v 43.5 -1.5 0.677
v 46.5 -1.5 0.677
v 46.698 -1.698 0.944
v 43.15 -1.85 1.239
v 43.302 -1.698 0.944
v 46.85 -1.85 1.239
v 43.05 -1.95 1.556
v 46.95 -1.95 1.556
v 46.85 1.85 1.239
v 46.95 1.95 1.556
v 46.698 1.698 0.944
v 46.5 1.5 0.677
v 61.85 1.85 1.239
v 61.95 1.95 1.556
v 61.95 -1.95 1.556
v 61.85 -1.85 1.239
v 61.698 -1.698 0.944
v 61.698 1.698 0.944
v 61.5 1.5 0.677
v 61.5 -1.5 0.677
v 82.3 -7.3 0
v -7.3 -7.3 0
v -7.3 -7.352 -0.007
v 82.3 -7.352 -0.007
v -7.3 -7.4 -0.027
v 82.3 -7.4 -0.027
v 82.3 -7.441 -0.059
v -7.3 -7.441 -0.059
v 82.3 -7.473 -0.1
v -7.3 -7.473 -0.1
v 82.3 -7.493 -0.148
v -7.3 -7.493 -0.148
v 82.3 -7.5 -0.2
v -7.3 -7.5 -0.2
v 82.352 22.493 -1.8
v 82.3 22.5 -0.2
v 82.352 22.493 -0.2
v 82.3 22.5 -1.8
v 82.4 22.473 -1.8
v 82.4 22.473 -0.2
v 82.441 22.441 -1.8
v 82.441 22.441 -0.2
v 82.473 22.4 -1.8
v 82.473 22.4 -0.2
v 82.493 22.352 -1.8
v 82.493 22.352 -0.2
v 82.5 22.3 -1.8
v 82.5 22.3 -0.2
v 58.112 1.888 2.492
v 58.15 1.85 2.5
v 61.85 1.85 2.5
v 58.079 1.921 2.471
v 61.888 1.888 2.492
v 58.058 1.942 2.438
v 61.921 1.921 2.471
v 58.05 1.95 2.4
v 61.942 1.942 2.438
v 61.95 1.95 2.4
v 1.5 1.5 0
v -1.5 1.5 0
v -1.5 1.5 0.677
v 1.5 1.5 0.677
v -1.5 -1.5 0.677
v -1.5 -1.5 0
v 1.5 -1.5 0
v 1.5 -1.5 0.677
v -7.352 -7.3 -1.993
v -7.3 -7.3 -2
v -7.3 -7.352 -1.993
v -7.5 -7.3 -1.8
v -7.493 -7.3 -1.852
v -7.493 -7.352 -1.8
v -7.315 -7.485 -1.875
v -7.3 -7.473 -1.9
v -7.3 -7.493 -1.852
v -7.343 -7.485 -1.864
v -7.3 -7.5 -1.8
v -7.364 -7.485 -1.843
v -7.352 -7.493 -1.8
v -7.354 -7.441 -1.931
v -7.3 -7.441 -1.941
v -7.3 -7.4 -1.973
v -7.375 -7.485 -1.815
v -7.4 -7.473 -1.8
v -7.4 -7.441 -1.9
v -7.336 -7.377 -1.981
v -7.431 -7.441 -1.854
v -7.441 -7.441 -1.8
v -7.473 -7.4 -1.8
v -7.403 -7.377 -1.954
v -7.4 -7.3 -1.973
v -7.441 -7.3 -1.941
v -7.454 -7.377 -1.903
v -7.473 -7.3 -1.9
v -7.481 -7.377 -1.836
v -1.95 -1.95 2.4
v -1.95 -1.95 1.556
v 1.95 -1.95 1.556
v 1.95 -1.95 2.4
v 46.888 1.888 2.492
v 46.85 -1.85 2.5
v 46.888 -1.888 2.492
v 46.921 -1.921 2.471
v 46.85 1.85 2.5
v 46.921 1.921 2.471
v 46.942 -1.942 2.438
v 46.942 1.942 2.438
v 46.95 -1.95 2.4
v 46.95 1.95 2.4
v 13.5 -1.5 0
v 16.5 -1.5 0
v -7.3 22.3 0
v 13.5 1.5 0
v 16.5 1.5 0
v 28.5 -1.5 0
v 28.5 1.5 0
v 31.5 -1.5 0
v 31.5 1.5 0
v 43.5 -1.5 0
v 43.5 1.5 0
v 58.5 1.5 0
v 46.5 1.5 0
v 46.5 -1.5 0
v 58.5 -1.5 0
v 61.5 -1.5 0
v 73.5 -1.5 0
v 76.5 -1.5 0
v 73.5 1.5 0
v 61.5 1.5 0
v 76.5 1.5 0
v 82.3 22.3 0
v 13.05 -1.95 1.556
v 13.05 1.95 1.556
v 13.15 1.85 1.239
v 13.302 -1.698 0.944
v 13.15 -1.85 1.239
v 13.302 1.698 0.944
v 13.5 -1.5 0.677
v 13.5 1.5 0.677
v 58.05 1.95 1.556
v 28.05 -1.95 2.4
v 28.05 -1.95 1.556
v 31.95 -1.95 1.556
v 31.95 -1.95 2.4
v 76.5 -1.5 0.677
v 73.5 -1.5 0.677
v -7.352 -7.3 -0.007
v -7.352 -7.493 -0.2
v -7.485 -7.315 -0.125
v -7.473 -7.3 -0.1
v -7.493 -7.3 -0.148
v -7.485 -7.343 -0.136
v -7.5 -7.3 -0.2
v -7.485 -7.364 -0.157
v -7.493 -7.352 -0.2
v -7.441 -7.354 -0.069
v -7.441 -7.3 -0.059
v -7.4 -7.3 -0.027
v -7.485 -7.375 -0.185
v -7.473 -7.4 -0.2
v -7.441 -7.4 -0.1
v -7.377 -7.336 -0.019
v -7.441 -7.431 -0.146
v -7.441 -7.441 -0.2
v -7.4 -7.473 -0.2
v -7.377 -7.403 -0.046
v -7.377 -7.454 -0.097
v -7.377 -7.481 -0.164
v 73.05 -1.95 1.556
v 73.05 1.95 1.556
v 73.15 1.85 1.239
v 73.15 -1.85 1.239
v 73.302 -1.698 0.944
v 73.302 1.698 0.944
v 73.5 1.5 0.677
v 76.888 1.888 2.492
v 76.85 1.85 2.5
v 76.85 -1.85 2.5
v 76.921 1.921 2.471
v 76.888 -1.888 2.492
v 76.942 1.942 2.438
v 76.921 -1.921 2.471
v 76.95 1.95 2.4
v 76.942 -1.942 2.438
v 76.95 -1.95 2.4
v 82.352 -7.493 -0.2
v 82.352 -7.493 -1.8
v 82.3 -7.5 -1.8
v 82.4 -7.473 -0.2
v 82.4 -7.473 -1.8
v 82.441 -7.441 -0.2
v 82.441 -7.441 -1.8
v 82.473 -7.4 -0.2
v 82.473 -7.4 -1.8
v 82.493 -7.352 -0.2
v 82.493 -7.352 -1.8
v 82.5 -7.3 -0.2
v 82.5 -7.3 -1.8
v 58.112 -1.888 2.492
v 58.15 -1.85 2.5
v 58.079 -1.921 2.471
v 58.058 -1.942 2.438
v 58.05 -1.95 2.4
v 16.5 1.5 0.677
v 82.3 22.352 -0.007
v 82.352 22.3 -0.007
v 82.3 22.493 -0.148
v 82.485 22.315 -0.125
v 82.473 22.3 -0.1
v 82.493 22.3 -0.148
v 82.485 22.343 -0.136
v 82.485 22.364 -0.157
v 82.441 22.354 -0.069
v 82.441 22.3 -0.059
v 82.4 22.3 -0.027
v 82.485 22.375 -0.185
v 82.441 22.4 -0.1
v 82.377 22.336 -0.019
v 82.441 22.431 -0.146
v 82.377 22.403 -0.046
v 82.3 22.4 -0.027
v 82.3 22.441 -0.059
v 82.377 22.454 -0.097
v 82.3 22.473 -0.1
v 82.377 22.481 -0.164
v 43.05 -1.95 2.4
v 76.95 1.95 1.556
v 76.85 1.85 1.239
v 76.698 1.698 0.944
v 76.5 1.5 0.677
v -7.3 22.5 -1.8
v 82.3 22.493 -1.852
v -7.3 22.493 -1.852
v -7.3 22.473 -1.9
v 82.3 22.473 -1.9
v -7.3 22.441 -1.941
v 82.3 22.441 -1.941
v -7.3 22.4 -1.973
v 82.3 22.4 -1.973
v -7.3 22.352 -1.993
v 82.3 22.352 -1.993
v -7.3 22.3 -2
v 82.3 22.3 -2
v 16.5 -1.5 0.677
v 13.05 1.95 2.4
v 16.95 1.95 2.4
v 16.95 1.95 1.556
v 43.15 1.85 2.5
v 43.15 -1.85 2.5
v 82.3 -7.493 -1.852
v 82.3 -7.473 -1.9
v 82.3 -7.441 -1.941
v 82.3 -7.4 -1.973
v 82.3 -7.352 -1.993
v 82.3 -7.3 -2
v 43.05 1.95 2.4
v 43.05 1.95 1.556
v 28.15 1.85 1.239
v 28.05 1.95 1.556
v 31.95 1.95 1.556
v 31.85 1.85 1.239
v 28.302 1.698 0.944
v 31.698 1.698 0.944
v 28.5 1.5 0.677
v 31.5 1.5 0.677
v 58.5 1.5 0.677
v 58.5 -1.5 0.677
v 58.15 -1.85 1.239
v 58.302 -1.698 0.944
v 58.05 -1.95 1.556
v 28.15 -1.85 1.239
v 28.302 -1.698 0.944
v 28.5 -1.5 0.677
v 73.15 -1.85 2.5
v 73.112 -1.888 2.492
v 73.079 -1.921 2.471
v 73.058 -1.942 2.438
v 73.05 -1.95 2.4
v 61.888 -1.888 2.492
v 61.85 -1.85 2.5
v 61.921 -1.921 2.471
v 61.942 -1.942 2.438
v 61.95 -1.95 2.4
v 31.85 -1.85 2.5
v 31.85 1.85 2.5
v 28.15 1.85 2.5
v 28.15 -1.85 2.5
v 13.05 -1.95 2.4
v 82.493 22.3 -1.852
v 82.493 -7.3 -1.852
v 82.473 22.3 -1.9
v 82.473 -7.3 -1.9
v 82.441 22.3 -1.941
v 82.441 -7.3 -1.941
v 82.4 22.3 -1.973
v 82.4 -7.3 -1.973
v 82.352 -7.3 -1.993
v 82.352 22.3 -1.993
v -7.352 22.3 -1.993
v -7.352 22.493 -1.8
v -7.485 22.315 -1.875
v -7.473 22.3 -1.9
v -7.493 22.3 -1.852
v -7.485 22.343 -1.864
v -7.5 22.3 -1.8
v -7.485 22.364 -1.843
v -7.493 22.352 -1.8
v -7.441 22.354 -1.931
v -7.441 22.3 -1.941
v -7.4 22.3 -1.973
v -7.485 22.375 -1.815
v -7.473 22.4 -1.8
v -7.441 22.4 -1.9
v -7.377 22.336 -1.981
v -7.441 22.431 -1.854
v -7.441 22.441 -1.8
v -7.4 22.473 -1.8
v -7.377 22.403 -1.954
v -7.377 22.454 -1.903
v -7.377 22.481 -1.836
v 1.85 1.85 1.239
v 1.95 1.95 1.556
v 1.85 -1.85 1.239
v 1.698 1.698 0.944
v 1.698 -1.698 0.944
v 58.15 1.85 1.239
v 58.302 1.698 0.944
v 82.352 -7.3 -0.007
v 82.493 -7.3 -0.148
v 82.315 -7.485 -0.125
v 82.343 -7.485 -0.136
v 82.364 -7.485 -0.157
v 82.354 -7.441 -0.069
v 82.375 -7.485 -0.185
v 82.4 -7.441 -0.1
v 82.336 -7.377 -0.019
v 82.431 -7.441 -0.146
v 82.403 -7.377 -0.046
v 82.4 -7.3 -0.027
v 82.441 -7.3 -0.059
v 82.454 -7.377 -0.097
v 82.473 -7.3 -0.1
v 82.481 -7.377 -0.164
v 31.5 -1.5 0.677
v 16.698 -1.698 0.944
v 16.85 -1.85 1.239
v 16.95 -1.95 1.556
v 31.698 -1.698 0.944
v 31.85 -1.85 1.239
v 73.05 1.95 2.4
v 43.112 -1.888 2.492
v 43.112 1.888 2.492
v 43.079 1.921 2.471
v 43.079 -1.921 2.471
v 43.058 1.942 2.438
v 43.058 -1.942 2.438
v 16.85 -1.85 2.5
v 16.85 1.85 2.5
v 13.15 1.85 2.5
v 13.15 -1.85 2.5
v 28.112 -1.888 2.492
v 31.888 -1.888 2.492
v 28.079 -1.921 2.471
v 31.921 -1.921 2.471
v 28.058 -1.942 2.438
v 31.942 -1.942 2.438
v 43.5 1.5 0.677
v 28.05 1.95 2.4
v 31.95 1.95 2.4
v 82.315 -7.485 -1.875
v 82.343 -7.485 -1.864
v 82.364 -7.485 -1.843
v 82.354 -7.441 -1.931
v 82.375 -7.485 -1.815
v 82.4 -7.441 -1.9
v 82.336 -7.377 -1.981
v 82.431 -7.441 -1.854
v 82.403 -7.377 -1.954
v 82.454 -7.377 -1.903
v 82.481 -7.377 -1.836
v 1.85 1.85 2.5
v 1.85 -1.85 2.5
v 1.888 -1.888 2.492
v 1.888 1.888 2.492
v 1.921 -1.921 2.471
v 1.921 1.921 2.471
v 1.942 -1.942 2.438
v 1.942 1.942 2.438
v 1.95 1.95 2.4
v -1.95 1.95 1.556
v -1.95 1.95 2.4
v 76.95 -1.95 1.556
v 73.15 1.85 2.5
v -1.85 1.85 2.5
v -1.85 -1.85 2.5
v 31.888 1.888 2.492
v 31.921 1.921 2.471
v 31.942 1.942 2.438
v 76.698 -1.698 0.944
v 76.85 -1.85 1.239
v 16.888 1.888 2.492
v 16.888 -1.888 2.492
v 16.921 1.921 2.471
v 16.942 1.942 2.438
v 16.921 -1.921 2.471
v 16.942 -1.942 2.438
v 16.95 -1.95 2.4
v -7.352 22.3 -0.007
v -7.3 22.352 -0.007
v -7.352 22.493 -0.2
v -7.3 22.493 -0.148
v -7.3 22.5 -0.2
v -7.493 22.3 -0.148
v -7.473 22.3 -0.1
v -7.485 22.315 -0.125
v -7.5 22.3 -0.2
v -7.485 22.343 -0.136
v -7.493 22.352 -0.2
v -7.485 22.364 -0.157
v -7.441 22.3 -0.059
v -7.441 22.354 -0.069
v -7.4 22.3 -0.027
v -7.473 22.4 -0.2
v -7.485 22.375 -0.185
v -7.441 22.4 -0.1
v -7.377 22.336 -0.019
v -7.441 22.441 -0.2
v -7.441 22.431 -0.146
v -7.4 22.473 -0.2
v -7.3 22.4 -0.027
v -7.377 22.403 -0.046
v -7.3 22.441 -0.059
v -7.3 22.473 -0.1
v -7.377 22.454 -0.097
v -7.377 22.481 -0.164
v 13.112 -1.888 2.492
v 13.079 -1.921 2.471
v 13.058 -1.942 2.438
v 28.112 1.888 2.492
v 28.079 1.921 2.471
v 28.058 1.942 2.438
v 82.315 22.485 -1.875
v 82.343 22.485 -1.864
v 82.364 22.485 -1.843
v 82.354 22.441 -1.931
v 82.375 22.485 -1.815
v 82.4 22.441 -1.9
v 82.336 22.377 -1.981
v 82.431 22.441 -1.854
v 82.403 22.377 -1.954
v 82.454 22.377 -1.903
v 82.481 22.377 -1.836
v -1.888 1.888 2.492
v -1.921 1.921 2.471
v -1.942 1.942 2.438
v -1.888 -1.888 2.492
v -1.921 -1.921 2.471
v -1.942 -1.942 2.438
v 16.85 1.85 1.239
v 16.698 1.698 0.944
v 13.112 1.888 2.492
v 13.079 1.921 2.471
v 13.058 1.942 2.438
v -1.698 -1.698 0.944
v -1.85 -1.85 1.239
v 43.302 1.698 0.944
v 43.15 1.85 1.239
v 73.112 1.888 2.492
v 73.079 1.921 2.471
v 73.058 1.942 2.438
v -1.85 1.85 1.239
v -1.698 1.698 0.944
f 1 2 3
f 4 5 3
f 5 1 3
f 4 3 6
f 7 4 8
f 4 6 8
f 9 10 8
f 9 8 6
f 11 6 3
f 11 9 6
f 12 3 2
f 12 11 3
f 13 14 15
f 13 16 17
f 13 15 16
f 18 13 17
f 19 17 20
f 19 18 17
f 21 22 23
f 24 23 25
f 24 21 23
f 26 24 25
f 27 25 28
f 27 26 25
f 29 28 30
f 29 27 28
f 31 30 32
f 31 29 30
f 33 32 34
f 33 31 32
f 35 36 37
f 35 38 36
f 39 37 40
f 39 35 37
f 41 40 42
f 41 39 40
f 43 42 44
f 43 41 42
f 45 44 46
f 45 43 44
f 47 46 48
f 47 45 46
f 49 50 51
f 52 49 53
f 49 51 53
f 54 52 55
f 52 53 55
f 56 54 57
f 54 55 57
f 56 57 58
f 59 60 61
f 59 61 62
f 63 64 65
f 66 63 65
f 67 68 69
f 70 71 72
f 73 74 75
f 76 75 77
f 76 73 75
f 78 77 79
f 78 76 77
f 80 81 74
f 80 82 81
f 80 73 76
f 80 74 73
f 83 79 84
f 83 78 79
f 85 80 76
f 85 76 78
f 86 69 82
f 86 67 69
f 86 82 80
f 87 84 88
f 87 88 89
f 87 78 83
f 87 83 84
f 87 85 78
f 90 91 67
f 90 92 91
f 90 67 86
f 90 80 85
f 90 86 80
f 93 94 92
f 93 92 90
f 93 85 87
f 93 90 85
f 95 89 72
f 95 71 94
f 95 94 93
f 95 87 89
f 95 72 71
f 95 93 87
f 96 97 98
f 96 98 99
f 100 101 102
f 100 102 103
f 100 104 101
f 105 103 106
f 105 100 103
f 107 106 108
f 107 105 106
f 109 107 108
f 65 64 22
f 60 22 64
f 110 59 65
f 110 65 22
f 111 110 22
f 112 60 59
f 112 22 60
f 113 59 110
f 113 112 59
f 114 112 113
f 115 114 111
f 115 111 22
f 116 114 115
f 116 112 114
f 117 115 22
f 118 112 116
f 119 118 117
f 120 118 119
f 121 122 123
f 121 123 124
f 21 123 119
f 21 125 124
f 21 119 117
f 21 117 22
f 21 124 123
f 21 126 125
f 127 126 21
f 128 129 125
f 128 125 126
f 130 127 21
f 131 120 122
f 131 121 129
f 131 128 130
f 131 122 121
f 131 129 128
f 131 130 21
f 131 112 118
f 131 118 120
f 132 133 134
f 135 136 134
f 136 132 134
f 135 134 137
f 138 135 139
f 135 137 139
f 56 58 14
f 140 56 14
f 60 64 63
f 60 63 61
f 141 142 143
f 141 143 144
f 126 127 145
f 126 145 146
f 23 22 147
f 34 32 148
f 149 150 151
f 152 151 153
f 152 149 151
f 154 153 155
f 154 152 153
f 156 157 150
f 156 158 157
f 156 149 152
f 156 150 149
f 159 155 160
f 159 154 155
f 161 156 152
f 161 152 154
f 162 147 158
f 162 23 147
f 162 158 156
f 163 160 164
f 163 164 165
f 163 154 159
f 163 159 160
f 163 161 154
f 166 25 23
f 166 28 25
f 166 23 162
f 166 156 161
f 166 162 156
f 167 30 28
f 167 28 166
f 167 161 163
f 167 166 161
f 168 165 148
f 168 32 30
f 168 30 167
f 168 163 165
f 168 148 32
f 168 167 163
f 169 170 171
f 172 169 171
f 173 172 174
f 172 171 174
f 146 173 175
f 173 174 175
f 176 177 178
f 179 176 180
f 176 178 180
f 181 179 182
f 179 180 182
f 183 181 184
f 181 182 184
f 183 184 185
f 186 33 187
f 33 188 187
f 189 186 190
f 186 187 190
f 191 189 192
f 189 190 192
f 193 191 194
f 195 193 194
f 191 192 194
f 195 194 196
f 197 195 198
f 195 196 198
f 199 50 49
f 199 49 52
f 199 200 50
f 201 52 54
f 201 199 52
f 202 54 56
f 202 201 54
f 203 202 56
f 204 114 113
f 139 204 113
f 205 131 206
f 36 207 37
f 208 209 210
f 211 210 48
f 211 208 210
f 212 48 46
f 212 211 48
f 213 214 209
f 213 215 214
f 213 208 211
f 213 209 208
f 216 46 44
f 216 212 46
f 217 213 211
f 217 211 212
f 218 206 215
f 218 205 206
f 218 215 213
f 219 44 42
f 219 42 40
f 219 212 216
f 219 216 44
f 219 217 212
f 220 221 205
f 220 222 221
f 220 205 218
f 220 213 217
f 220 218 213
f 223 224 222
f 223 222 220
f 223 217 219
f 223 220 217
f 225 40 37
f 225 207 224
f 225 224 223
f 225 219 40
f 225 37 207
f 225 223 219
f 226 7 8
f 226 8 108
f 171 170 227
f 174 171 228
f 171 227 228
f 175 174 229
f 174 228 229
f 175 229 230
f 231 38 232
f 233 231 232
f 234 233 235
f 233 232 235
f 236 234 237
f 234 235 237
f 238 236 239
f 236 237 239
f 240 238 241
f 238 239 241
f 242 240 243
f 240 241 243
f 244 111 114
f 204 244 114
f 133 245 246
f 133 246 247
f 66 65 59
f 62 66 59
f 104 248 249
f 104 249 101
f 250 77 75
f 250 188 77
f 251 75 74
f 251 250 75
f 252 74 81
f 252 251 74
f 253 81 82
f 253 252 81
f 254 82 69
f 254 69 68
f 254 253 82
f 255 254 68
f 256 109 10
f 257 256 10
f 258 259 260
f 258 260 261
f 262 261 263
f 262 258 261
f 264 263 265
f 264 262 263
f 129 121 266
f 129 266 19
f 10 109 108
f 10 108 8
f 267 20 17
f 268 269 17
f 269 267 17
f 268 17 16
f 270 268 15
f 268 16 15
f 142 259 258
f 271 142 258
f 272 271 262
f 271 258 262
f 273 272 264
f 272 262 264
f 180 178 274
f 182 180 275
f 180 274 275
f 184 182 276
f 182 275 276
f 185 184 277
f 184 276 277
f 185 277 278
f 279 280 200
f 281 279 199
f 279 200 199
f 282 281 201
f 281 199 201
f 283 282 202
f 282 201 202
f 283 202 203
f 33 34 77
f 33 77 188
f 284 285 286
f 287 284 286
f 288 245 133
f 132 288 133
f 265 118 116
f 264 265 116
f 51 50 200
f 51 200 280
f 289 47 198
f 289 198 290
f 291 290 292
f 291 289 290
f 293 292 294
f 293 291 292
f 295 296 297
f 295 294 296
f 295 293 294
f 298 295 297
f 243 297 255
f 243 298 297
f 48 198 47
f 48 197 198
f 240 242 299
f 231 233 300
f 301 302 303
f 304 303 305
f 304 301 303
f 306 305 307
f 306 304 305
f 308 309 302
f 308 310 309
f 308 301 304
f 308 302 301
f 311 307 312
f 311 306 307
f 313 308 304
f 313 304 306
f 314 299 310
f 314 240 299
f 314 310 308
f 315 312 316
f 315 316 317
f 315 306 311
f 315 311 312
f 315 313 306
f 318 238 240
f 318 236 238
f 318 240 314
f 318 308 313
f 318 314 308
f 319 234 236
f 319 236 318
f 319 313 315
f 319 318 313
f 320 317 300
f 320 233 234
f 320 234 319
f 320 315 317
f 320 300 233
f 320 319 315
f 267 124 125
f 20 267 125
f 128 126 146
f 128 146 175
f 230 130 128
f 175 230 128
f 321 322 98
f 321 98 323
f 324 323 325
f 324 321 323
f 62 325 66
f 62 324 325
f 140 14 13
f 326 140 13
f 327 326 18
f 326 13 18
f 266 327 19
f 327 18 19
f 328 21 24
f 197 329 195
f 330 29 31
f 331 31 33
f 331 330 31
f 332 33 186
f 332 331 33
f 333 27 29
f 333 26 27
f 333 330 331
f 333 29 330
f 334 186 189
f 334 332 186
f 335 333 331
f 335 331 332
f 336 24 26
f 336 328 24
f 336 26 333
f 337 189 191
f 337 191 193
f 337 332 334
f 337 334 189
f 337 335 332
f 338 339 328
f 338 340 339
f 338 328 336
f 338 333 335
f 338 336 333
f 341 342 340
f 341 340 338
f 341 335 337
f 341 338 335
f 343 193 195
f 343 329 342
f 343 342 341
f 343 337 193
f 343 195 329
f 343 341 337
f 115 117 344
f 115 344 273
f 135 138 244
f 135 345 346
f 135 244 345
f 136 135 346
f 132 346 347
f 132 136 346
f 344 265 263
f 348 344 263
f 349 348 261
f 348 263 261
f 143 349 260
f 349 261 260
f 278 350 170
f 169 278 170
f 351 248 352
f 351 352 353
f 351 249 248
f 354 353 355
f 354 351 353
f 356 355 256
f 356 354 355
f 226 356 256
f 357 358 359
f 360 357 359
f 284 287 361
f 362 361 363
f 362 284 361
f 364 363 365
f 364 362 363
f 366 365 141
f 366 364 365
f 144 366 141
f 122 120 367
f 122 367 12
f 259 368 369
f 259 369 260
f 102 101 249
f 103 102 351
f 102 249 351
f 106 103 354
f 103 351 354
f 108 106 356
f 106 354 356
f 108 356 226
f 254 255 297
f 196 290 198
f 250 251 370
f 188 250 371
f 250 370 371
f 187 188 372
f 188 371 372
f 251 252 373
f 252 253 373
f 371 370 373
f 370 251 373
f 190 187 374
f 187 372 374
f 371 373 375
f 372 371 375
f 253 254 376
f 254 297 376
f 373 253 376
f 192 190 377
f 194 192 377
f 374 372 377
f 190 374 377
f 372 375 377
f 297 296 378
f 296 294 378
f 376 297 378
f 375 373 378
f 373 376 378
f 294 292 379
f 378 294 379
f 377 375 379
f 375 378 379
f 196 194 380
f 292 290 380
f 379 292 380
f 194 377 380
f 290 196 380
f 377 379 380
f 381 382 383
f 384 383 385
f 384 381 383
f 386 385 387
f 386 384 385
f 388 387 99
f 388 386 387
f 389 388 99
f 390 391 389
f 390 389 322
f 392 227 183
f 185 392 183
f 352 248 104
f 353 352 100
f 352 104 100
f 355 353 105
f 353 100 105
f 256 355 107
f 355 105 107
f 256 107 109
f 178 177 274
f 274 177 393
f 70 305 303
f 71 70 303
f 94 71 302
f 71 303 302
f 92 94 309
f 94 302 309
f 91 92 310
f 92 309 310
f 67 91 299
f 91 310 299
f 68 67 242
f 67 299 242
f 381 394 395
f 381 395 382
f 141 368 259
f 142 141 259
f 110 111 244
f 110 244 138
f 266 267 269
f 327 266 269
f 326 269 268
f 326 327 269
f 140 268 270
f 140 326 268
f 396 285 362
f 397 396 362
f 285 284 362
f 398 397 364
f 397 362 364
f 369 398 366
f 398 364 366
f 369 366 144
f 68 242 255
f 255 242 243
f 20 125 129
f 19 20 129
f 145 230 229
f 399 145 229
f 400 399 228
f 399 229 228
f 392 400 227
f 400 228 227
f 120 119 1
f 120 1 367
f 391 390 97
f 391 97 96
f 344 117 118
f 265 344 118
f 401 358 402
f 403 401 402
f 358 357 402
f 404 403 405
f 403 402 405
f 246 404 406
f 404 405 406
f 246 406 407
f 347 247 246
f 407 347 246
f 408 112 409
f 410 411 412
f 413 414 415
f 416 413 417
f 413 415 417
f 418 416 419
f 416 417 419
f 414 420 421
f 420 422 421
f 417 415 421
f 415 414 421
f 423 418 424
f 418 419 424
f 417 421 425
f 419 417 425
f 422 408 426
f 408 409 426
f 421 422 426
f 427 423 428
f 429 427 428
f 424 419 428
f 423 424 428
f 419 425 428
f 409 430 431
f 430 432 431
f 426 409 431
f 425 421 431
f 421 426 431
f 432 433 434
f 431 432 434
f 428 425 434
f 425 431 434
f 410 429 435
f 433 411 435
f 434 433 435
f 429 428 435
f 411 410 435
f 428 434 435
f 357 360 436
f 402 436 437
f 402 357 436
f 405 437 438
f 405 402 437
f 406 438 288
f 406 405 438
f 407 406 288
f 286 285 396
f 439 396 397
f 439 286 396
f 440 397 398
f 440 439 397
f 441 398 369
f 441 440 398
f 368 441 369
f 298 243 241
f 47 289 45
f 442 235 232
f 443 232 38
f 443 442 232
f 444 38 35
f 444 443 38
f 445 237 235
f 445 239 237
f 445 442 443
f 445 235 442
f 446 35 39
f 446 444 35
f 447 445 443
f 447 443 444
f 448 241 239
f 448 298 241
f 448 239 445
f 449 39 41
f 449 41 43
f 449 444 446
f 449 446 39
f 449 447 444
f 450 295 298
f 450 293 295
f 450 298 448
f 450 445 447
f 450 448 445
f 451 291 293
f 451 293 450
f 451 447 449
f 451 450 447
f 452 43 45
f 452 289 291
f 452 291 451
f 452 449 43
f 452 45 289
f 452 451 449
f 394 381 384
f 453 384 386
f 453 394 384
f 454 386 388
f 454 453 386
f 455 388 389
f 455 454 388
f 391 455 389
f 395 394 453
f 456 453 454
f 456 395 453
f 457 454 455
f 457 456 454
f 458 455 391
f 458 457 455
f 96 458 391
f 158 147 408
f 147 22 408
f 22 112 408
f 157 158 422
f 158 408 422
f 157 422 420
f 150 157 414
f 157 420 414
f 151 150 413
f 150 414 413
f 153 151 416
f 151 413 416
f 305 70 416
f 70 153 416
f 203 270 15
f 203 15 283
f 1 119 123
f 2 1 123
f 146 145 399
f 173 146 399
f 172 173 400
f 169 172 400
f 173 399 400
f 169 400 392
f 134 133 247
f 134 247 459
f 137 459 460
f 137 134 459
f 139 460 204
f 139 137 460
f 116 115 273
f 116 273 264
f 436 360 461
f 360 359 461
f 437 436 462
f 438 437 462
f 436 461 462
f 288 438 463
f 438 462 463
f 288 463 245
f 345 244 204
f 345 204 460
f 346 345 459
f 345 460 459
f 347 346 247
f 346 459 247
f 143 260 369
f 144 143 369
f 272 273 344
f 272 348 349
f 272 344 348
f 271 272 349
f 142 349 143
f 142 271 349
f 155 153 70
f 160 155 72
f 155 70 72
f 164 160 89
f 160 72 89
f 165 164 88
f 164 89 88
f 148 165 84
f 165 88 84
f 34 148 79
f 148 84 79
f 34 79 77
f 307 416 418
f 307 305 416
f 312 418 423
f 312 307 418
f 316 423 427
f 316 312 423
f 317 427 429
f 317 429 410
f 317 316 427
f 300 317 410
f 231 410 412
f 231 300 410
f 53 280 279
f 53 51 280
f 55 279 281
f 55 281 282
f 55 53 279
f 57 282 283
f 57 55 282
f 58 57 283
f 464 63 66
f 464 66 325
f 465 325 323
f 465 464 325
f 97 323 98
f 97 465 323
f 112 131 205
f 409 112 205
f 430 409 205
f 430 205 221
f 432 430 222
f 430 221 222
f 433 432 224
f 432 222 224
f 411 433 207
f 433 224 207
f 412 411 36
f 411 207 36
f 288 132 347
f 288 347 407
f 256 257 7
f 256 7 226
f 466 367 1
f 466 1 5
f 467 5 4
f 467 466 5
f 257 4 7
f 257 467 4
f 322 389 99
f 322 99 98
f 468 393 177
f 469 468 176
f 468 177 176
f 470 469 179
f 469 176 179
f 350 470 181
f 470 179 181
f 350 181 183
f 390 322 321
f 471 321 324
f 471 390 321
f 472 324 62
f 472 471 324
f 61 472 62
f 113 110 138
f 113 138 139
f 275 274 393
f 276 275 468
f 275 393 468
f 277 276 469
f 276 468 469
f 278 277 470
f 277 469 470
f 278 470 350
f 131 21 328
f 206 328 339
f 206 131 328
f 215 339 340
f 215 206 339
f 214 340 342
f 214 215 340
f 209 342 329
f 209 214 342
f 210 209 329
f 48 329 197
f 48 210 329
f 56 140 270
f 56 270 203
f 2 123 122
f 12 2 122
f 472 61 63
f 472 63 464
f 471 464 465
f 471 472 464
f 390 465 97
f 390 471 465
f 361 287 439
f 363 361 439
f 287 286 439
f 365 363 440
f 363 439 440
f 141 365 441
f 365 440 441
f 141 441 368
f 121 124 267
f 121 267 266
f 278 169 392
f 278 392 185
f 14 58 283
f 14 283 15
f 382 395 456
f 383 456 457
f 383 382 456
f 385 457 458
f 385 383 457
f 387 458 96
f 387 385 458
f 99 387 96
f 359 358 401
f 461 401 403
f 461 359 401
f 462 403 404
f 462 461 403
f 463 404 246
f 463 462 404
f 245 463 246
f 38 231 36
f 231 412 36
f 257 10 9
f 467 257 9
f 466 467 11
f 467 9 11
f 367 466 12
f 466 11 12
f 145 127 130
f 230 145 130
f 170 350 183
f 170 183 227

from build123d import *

# Parameters (mm, degrees)
SKETCH_1_W                      = 90
SKETCH_1_H                      = 30
EXTRUDE_1_DEPTH                 = 2
SKETCH_2_W                      = 3
SKETCH_2_H                      = 3
EXTRUDE_2_DEPTH                 = 1
EXTRUDE_3_DEPTH                 = 2
CUT_EXTRUDE_1_REACH             = 87.55
CUT_EXTRUDE_1_DIRECTION_2_REACH = 87.55
FILLET_1_R                      = 0.1
FILLET_1_OF_MIRROR_1_R          = 0.1
FILLET_1_OF_MIRROR_3_R          = 0.1
FILLET_2_R                      = 0.2


# Read off the part's stored shape, not the designer's step: 镜向4
with BuildPart() as part:
    # 草图1 → 凸台-拉伸1 (new body)
    with BuildSketch(Plane.XY):
        with Locations((37.5, 7.5)):
            Rectangle(SKETCH_1_W, SKETCH_1_H)
    extrude(amount=-EXTRUDE_1_DEPTH)

    # 草图2 → 凸台-拉伸2 (add)
    with BuildSketch(Plane.XY):
        Rectangle(SKETCH_2_W, SKETCH_2_H)
    extrude_2 = extrude(amount=EXTRUDE_2_DEPTH)

    # 草图3 → 凸台-拉伸3 (add, symmetric)
    with BuildSketch(Plane(origin=(0, 0, 0), x_dir=(1, 0, 0), z_dir=(0, 1, 0))):
        with BuildLine():
            Line((-1.95, -2.5), (1.95, -2.5))
            Line((1.95, -2.5), (1.95, -1.555590279))
            ThreePointArc((1.95, -1.555590279), (1.780042303, -1.088161527), (1.5, -0.677124344))
            Line((1.5, -0.677124344), (-1.5, -0.677124344))
            ThreePointArc((-1.5, -0.677124344), (-1.780042303, -1.088161527), (-1.95, -1.555590279))
            Line((-1.95, -1.555590279), (-1.95, -2.5))
        make_face()
    extrude_3 = extrude(amount=EXTRUDE_3_DEPTH, both=True)

    # 草图4 → 切除-拉伸1 (cut, up to next)
    with BuildSketch(Plane(origin=(0, 0, 0), x_dir=(0, 0, -1), z_dir=(1, 0, 0)), mode=Mode.PRIVATE) as cut_extrude_1_sk1:
        with BuildLine():
            Line((-2.5, 1.95), (-1.555590279, 1.95))
            ThreePointArc((-1.555590279, 1.95), (-1.088161527, 1.780042303), (-0.677124344, 1.5))
            Line((-0.677124344, 1.5), (-0.677124344, 2))
            Line((-0.677124344, 2), (-2.5, 2))
            Line((-2.5, 2), (-2.5, 1.95))
        make_face()
    cut_extrude_1_tool1 = extrude(cut_extrude_1_sk1.sketch, amount=-CUT_EXTRUDE_1_REACH, mode=Mode.PRIVATE) & part.part
    # 草图4 → 切除-拉伸1 (cut, up to next)
    with BuildSketch(Plane(origin=(0, 0, 0), x_dir=(0, 0, -1), z_dir=(1, 0, 0)), mode=Mode.PRIVATE) as cut_extrude_1_sk2:
        with BuildLine():
            Line((-2.5, -2), (-0.677124344, -2))
            Line((-0.677124344, -2), (-0.677124344, -1.5))
            ThreePointArc((-0.677124344, -1.5), (-1.088161527, -1.780042303), (-1.555590279, -1.95))
            Line((-1.555590279, -1.95), (-2.5, -1.95))
            Line((-2.5, -1.95), (-2.5, -2))
        make_face()
    cut_extrude_1_tool2 = extrude(cut_extrude_1_sk2.sketch, amount=-CUT_EXTRUDE_1_REACH, mode=Mode.PRIVATE) & part.part
    cut_extrude_1_1 = cut_extrude_1_tool1.solids().sort_by_distance((0, 1.873038, 1.175075))[0]
    add(cut_extrude_1_1, mode=Mode.SUBTRACT)
    cut_extrude_1_2 = cut_extrude_1_tool2.solids().sort_by_distance((0, -1.873038, 1.175075))[0]
    add(cut_extrude_1_2, mode=Mode.SUBTRACT)
    cut_extrude_1 = cut_extrude_1_1 + cut_extrude_1_2  # 切除-拉伸1 as one shape, for the pattern or mirror that repeats it

    # 草图4 → 切除-拉伸1 direction 2 (cut, up to next)
    with BuildSketch(Plane(origin=(0, 0, 0), x_dir=(0, 0, -1), z_dir=(1, 0, 0)), mode=Mode.PRIVATE) as cut_extrude_1_direction_2_sk1:
        with BuildLine():
            Line((-2.5, 1.95), (-1.555590279, 1.95))
            ThreePointArc((-1.555590279, 1.95), (-1.088161527, 1.780042303), (-0.677124344, 1.5))
            Line((-0.677124344, 1.5), (-0.677124344, 2))
            Line((-0.677124344, 2), (-2.5, 2))
            Line((-2.5, 2), (-2.5, 1.95))
        make_face()
    cut_extrude_1_direction_2_tool1 = extrude(cut_extrude_1_direction_2_sk1.sketch, amount=CUT_EXTRUDE_1_DIRECTION_2_REACH, mode=Mode.PRIVATE) & part.part
    # 草图4 → 切除-拉伸1 direction 2 (cut, up to next)
    with BuildSketch(Plane(origin=(0, 0, 0), x_dir=(0, 0, -1), z_dir=(1, 0, 0)), mode=Mode.PRIVATE) as cut_extrude_1_direction_2_sk2:
        with BuildLine():
            Line((-2.5, -2), (-0.677124344, -2))
            Line((-0.677124344, -2), (-0.677124344, -1.5))
            ThreePointArc((-0.677124344, -1.5), (-1.088161527, -1.780042303), (-1.555590279, -1.95))
            Line((-1.555590279, -1.95), (-2.5, -1.95))
            Line((-2.5, -1.95), (-2.5, -2))
        make_face()
    cut_extrude_1_direction_2_tool2 = extrude(cut_extrude_1_direction_2_sk2.sketch, amount=CUT_EXTRUDE_1_DIRECTION_2_REACH, mode=Mode.PRIVATE) & part.part
    cut_extrude_1_direction_2_1 = cut_extrude_1_direction_2_tool1.solids().sort_by_distance((0, 1.873038, 1.175075))[0]
    add(cut_extrude_1_direction_2_1, mode=Mode.SUBTRACT)
    cut_extrude_1_direction_2_2 = cut_extrude_1_direction_2_tool2.solids().sort_by_distance((0, -1.873038, 1.175075))[0]
    add(cut_extrude_1_direction_2_2, mode=Mode.SUBTRACT)
    cut_extrude_1_direction_2 = cut_extrude_1_direction_2_1 + cut_extrude_1_direction_2_2  # 切除-拉伸1 direction 2 as one shape, for the pattern or mirror that repeats it

    # 圆角1
    fillet_1_edges = [part.edges().sort_by_distance(p)[0] for p in [
        (-1.95, 0, 2.5),
        (1.95, 0, 2.5),
        (0, -1.95, 2.5),
        (0, 1.95, 2.5),
    ]]
    fillet(fillet_1_edges, radius=FILLET_1_R)

    # 镜向1: 凸台-拉伸2, 凸台-拉伸3, 切除-拉伸1, 切除-拉伸1 direction 2 across plane
    add(extrude_2.mirror(Plane(origin=(7.5, 0, 0), x_dir=(0, 0, 1), z_dir=(1, 0, 0))))
    add(extrude_3.mirror(Plane(origin=(7.5, 0, 0), x_dir=(0, 0, 1), z_dir=(1, 0, 0))))
    add(cut_extrude_1.mirror(Plane(origin=(7.5, 0, 0), x_dir=(0, 0, 1), z_dir=(1, 0, 0))), mode=Mode.SUBTRACT)
    add(cut_extrude_1_direction_2.mirror(Plane(origin=(7.5, 0, 0), x_dir=(0, 0, 1), z_dir=(1, 0, 0))), mode=Mode.SUBTRACT)

    # 圆角1 of 镜向1
    fillet_1_of_mirror_1_edges = [part.edges().sort_by_distance(p)[0] for p in [
        (16.95, 0, 2.5),
        (13.05, 0, 2.5),
        (15, -1.95, 2.5),
        (15, 1.95, 2.5),
    ]]
    fillet(fillet_1_of_mirror_1_edges, radius=FILLET_1_OF_MIRROR_1_R)

    # 镜向3: 凸台-拉伸2, 凸台-拉伸3, 切除-拉伸1, 切除-拉伸1 direction 2 across plane
    add(extrude_2.mirror(Plane(origin=(15, 0, 0), x_dir=(0, 0, 1), z_dir=(1, 0, 0))))
    add(extrude_3.mirror(Plane(origin=(15, 0, 0), x_dir=(0, 0, 1), z_dir=(1, 0, 0))))
    add(cut_extrude_1.mirror(Plane(origin=(15, 0, 0), x_dir=(0, 0, 1), z_dir=(1, 0, 0))), mode=Mode.SUBTRACT)
    add(cut_extrude_1_direction_2.mirror(Plane(origin=(15, 0, 0), x_dir=(0, 0, 1), z_dir=(1, 0, 0))), mode=Mode.SUBTRACT)

    # 圆角1 of 镜向3
    fillet_1_of_mirror_3_edges = [part.edges().sort_by_distance(p)[0] for p in [
        (31.95, 0, 2.5),
        (28.05, 0, 2.5),
        (30, -1.95, 2.5),
        (30, 1.95, 2.5),
    ]]
    fillet(fillet_1_of_mirror_3_edges, radius=FILLET_1_OF_MIRROR_3_R)

    # 镜向4: part across plane


with BuildPart() as part_1:
    add(part.part)
    add(part.part.mirror(Plane(origin=(37.5, 0, 0), x_dir=(0, 0, 1), z_dir=(1, 0, 0))))

    # 圆角2
    fillet_2_edges = [part_1.edges().sort_by_distance(p)[0] for p in [
        (82.5, 7.5, -2),
        (37.5, 22.5, -2),
        (-7.5, 7.5, -2),
        (37.5, 22.5, 0),
        (82.5, 7.5, 0),
        (37.5, -7.5, 0),
        (-7.5, 7.5, 0),
        (37.5, -7.5, -2),
        (-7.5, 22.5, -1),
        (82.5, 22.5, -1),
        (82.5, -7.5, -1),
        (-7.5, -7.5, -1),
    ]]
    fillet(fillet_2_edges, radius=FILLET_2_R)


solid = part_1.part
